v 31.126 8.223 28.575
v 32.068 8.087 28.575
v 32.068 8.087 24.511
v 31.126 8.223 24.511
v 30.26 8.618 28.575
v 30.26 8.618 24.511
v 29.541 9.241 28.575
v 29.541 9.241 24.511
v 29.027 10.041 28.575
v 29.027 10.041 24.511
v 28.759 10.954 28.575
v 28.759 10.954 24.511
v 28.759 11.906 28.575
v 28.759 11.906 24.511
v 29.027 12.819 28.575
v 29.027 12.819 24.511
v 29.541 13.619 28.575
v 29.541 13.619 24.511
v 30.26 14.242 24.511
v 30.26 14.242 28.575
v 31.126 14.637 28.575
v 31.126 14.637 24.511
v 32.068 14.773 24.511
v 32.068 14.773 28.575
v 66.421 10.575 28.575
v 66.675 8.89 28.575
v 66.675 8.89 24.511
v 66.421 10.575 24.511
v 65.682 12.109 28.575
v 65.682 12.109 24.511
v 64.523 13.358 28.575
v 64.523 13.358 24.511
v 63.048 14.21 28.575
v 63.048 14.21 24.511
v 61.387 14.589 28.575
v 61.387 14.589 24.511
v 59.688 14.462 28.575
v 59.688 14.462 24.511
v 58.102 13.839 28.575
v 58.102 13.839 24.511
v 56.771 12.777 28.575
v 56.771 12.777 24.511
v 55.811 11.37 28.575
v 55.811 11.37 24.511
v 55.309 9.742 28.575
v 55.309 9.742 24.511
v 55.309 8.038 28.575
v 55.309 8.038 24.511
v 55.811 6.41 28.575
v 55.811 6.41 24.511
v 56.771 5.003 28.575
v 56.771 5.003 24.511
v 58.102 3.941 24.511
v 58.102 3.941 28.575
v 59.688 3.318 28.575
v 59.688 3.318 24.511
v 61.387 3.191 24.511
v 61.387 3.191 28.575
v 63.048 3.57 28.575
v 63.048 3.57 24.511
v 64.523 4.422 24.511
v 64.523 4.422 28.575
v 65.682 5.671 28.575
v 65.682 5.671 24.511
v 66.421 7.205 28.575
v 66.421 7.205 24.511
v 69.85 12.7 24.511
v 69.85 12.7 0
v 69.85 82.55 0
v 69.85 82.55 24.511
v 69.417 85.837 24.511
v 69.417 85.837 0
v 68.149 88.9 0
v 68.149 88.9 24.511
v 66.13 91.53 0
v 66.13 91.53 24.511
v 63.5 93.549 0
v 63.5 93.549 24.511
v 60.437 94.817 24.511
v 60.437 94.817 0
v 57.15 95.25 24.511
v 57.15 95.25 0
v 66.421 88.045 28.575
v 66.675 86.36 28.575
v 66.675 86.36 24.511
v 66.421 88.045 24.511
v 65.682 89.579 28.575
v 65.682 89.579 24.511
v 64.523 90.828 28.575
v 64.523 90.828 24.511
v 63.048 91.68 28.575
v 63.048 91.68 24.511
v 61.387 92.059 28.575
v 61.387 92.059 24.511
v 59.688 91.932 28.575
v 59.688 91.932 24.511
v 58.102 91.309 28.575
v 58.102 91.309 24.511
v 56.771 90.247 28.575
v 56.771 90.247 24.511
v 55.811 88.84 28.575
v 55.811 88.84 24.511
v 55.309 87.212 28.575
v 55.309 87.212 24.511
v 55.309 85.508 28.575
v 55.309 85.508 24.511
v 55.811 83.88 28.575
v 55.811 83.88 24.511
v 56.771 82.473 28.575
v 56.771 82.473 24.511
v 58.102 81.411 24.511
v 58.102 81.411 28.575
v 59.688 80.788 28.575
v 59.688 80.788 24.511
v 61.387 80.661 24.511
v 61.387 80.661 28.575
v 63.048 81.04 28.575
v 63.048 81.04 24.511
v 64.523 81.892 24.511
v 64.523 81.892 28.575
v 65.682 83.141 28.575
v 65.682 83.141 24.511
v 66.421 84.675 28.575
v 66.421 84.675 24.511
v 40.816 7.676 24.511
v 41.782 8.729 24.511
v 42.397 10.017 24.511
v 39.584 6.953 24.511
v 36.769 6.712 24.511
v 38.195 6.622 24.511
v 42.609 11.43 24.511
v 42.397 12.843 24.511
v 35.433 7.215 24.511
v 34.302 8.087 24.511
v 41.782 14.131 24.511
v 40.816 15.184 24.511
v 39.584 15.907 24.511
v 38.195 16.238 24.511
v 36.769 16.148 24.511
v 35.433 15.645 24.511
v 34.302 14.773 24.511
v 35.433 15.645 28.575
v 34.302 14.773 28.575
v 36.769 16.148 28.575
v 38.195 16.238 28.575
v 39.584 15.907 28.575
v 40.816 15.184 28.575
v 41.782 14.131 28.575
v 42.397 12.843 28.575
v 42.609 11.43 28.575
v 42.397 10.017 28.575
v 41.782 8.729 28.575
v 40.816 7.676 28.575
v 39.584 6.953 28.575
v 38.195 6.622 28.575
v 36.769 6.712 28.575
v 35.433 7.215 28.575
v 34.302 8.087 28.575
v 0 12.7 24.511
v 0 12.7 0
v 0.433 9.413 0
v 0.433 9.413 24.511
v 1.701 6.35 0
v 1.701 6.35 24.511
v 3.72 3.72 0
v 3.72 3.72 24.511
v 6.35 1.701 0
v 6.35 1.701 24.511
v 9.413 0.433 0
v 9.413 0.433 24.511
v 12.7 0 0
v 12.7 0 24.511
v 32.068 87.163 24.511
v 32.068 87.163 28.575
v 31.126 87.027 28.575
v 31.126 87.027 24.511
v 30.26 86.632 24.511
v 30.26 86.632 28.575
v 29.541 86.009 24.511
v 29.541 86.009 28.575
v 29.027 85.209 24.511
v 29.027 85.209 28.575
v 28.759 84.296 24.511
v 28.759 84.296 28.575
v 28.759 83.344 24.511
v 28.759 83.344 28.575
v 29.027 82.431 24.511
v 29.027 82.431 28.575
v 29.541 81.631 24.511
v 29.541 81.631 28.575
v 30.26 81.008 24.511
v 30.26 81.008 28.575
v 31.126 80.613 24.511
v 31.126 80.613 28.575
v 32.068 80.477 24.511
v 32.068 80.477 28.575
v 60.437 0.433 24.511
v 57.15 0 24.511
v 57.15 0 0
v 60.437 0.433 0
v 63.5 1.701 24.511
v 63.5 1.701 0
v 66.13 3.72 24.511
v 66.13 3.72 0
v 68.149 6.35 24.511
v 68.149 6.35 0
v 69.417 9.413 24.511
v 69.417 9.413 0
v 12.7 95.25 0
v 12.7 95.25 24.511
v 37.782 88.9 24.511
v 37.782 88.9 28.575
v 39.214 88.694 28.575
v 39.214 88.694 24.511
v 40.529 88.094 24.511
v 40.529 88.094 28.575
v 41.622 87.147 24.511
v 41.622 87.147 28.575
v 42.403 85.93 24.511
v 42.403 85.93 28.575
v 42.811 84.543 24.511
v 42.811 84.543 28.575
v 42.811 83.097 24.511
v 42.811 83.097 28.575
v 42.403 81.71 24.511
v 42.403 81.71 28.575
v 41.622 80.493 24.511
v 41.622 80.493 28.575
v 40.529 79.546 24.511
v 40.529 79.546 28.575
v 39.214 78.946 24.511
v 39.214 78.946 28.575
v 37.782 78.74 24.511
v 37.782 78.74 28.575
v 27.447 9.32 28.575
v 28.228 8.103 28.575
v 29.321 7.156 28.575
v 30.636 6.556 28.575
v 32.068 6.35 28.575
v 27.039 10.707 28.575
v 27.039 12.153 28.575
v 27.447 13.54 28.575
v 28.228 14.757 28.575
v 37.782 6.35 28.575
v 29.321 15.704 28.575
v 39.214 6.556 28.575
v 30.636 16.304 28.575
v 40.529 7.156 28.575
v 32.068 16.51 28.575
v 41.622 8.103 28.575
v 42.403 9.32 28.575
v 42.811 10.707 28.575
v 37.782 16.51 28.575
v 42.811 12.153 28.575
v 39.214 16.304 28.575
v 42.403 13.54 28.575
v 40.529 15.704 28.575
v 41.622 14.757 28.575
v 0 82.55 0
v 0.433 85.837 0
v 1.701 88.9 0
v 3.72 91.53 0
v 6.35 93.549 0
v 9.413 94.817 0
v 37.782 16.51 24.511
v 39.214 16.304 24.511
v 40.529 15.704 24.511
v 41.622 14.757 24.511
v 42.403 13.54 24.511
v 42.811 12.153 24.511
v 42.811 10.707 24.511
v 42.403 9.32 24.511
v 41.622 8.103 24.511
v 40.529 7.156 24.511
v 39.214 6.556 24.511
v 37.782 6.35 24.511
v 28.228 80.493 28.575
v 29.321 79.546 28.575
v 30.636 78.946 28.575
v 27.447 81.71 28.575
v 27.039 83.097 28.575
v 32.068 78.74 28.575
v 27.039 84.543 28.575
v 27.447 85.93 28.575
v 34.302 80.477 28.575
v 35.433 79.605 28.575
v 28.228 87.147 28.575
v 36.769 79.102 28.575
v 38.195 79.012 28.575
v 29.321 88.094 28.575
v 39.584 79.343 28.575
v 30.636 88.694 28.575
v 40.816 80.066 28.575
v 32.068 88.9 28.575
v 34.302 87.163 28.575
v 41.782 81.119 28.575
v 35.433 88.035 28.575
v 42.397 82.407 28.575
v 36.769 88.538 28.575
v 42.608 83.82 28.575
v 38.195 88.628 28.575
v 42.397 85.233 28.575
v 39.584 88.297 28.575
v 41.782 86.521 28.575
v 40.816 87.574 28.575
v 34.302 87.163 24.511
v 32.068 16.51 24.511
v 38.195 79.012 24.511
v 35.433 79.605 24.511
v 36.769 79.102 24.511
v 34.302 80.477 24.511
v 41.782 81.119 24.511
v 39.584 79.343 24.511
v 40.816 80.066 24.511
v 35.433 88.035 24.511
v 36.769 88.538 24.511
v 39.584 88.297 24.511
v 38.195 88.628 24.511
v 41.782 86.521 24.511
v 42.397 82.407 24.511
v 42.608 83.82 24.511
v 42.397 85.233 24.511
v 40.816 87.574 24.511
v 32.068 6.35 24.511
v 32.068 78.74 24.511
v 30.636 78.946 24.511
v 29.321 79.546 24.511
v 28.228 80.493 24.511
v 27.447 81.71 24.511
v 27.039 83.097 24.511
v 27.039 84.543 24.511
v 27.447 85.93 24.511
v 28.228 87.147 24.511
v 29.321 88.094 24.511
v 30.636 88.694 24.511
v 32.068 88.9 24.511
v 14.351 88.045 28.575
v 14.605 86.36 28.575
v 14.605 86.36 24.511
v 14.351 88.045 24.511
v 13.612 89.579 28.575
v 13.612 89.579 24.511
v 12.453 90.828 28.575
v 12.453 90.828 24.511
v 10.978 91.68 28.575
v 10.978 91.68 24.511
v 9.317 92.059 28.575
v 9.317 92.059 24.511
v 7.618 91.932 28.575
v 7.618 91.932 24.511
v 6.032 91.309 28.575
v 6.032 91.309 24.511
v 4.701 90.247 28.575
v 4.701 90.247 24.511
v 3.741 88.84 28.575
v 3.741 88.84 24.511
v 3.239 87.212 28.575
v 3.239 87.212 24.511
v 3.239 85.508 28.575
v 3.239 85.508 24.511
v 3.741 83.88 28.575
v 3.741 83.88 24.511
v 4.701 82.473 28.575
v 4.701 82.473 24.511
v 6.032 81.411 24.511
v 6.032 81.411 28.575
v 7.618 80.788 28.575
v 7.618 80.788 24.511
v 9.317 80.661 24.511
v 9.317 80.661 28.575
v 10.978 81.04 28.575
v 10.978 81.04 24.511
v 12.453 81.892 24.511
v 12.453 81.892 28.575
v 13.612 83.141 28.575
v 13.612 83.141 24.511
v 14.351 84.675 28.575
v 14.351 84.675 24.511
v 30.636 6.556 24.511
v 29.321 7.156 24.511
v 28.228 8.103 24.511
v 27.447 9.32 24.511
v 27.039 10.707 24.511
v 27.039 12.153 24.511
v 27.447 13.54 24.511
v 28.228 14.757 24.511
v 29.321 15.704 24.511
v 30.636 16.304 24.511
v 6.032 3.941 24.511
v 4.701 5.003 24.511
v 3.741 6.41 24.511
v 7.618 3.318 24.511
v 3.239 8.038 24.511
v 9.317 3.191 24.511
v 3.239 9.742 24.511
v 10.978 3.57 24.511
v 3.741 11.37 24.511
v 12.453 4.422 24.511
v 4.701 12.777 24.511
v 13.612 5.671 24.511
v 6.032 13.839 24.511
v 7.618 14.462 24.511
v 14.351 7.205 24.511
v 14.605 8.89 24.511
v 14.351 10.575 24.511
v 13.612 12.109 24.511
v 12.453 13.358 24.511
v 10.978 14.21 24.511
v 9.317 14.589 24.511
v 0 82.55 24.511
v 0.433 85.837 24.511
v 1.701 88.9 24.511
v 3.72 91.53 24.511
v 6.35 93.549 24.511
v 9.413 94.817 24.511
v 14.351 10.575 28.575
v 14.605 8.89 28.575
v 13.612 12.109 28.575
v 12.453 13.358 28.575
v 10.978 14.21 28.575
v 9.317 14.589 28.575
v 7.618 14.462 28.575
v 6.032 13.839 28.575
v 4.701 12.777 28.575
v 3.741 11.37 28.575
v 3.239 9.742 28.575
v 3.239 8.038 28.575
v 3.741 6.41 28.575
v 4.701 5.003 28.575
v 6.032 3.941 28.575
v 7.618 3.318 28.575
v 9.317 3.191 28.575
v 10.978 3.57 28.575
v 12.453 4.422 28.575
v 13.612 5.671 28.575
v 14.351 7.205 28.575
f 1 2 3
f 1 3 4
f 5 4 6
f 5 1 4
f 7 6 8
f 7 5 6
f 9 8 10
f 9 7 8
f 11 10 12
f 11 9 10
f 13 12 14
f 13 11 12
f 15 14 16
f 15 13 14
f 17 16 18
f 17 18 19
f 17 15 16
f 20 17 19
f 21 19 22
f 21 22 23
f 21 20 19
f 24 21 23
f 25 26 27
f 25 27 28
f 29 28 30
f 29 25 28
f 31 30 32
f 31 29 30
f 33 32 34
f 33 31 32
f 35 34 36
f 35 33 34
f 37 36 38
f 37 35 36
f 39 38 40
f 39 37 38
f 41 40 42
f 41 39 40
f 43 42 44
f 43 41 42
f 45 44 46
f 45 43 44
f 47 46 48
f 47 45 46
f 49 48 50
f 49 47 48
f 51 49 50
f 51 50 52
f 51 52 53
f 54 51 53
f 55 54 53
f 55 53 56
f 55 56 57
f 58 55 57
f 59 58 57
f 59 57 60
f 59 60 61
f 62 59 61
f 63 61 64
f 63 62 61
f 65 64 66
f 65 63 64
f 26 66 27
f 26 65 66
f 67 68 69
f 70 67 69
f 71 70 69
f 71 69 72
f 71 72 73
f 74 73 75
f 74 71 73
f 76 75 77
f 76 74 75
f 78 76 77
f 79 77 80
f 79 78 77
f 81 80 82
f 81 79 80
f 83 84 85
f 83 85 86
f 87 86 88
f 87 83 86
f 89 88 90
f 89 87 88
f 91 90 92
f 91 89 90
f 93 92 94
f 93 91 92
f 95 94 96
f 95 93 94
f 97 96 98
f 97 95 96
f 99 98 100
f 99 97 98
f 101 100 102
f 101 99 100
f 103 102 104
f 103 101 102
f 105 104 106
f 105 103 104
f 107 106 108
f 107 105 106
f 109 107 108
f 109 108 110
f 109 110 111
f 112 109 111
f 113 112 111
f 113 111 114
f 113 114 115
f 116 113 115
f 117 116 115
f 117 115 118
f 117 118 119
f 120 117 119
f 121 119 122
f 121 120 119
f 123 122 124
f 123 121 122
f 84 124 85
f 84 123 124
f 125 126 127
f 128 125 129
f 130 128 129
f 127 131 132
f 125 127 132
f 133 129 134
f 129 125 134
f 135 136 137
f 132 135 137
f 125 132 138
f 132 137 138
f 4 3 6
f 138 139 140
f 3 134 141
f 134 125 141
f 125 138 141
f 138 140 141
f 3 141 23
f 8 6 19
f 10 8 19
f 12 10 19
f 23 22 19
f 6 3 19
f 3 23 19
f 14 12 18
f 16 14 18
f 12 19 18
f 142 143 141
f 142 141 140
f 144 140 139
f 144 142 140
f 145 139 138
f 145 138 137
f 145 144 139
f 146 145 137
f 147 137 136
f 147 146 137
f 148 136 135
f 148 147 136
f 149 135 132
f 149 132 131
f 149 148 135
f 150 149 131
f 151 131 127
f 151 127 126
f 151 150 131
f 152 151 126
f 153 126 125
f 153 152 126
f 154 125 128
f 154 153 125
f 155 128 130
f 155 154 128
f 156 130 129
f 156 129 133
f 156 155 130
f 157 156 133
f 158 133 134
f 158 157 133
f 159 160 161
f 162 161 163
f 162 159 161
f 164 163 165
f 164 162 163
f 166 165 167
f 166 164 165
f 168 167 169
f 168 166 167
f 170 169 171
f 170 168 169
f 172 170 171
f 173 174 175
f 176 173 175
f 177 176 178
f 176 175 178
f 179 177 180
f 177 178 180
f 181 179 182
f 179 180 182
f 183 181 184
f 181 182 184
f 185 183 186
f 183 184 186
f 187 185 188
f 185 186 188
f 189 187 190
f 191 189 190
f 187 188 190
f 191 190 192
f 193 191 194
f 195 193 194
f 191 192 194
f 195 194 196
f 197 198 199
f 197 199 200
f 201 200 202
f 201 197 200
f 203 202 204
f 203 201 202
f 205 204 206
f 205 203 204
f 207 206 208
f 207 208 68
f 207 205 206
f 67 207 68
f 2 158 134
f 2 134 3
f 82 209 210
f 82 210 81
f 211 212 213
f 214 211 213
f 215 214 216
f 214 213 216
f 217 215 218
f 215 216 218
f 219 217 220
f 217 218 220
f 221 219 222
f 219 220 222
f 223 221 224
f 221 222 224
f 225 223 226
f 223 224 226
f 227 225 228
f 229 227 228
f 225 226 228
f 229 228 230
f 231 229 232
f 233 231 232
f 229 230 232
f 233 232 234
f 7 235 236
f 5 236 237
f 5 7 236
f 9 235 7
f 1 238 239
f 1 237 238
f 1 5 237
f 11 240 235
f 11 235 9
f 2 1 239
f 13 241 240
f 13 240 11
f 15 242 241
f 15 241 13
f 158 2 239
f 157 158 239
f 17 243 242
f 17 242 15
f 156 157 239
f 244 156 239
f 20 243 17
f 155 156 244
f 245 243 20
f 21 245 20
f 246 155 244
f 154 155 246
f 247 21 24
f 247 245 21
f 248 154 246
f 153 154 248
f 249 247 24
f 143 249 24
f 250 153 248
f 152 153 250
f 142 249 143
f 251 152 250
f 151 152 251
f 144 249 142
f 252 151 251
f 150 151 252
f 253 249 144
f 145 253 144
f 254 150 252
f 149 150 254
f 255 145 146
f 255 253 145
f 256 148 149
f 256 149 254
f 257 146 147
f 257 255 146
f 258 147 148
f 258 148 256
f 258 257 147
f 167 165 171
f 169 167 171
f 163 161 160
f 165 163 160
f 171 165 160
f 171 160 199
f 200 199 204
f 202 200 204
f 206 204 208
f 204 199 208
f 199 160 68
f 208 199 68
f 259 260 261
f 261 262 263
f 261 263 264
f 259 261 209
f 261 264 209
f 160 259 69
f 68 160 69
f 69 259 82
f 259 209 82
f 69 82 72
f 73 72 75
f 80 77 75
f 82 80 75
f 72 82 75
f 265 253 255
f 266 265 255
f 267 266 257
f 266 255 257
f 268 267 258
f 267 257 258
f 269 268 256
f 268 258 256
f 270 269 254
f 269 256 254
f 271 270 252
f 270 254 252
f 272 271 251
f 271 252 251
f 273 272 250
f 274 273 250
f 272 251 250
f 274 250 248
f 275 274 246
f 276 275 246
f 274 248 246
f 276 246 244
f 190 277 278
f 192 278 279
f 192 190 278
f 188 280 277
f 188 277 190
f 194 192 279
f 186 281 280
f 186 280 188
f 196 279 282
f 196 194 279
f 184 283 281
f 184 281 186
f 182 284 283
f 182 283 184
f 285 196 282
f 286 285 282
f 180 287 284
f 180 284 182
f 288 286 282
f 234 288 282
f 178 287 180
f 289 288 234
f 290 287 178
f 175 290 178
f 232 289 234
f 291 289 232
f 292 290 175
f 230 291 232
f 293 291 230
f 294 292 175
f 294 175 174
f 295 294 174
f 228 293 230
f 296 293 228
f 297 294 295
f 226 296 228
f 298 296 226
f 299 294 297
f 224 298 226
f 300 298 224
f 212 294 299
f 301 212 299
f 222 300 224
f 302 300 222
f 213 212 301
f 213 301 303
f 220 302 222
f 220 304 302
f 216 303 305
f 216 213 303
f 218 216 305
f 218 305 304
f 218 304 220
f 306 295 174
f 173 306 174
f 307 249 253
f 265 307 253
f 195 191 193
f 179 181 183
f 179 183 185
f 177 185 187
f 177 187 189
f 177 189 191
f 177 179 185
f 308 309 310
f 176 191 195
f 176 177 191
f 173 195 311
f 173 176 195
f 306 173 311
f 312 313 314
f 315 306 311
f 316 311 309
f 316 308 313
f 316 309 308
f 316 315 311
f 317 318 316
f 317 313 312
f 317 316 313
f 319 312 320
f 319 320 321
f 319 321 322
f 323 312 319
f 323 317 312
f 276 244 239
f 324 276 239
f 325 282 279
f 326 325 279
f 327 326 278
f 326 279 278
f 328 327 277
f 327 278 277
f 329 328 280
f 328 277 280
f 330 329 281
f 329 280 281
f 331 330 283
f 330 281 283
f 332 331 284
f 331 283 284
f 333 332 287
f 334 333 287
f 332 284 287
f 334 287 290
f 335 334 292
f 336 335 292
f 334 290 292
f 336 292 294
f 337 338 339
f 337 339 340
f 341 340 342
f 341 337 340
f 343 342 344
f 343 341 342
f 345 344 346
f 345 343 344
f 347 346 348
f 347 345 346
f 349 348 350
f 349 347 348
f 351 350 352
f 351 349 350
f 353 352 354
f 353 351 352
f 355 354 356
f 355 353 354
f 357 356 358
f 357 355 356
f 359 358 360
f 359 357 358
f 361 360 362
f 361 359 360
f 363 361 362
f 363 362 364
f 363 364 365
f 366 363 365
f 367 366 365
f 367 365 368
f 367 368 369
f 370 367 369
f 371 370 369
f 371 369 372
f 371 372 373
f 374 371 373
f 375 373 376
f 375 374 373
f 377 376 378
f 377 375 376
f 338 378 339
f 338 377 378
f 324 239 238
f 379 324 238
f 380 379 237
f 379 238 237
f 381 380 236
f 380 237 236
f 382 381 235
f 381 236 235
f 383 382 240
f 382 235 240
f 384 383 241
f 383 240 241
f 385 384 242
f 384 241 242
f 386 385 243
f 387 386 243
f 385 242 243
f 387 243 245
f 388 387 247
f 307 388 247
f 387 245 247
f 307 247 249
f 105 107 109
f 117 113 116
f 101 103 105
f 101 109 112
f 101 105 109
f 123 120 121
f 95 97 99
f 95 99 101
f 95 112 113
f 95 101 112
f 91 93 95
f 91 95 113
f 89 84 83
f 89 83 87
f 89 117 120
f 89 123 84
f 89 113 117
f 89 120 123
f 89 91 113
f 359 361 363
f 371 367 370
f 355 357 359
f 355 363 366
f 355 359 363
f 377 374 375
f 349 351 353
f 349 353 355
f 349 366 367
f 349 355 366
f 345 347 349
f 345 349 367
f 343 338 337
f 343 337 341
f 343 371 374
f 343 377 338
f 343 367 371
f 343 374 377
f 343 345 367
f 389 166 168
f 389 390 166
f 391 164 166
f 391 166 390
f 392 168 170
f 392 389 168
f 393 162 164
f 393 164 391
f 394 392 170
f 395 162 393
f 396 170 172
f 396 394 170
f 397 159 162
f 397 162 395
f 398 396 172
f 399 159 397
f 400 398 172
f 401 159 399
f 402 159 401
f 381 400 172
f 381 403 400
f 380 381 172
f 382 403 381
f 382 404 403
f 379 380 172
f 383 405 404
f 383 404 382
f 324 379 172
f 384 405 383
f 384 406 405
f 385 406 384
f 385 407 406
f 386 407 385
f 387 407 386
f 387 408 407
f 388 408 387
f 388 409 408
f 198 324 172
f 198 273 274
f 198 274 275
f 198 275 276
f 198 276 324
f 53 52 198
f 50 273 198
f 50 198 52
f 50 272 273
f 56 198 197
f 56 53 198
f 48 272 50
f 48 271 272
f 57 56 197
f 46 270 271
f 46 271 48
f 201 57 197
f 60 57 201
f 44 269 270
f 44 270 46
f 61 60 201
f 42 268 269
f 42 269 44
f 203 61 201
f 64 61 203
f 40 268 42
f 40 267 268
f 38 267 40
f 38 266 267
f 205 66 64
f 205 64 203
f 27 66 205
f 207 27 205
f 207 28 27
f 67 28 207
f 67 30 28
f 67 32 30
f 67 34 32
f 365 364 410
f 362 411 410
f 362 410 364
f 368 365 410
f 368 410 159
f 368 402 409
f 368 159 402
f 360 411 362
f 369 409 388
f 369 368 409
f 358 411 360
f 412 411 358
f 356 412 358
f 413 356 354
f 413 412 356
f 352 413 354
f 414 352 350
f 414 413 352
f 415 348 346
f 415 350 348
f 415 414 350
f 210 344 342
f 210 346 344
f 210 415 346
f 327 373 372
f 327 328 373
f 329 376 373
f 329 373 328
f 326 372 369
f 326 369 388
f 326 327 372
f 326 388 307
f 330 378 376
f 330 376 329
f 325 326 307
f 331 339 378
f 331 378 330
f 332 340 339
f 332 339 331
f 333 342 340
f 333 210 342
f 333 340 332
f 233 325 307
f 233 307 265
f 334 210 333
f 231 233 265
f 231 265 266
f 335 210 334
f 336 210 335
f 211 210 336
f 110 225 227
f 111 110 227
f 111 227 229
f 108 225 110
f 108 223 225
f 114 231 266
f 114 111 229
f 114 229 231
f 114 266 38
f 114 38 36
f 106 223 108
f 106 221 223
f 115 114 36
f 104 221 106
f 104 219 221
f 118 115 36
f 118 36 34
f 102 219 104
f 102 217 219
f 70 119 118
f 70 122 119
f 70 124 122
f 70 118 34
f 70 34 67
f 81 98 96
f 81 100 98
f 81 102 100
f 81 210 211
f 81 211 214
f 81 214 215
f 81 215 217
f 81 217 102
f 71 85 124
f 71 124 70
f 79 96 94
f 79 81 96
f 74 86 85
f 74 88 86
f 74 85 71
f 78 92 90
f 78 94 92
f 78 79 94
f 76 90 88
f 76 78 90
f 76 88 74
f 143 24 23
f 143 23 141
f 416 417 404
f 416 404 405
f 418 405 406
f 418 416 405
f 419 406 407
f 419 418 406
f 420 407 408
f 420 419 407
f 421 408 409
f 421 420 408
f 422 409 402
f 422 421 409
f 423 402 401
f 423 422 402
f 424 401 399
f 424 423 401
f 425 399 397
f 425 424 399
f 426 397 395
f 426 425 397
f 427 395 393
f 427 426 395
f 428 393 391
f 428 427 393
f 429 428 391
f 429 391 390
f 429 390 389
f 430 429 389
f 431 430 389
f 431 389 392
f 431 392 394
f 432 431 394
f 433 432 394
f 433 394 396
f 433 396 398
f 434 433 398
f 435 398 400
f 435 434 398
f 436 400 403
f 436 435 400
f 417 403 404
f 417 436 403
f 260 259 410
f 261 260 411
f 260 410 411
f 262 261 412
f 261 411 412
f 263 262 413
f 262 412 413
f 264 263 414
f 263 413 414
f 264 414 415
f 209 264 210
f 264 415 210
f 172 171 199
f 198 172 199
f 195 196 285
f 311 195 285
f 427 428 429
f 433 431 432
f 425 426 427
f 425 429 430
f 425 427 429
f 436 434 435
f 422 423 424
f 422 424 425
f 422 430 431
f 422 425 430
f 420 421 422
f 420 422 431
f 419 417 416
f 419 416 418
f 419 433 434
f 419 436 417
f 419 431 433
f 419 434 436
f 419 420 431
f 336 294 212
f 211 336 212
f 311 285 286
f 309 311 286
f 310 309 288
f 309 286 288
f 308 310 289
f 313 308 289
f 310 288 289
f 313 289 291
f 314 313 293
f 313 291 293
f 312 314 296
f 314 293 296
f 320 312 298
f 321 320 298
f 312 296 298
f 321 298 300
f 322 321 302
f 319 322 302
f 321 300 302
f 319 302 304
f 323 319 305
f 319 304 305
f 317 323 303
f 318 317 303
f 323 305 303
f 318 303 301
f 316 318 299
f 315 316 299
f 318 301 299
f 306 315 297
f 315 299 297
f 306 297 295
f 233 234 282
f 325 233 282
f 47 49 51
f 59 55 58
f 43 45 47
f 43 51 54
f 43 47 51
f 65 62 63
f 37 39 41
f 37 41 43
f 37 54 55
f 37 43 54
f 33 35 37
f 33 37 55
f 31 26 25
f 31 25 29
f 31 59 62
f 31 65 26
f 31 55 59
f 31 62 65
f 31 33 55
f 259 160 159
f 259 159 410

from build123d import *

# Parameters (mm, degrees)
SKETCH1_W           = 69.85
SKETCH1_H           = 95.25
BOSS_EXTRUDE1_DEPTH = 28.575
FILLET1_R           = 12.7
SKETCH2_OUTSIDE_W   = 96.154
SKETCH2_OUTSIDE_H   = 121.554
SKETCH2_OUTSIDE_R   = 5.715
CUT_EXTRUDE1_DEPTH  = 4.064


with BuildPart() as part:
    # Sketch1 → Boss-Extrude1 (new body)
    with BuildSketch(Plane.XY):
        with Locations((34.925, 47.625)):
            Rectangle(SKETCH1_W, SKETCH1_H)
    extrude(amount=BOSS_EXTRUDE1_DEPTH)

    # Fillet1
    fillet1_edges = [part.edges().sort_by_distance(p)[0] for p in [
        (0, 95.25, 14.2875),
        (69.85, 95.25, 14.2875),
        (69.85, 0, 14.2875),
        (0, 0, 14.2875),
    ]]
    fillet(fillet1_edges, radius=FILLET1_R)

    # Sketch2 outside → Cut-Extrude1 (cut)
    # profile 1 of 3: a face of its own
    with BuildSketch(Plane.XY.offset(28.575)):
        with Locations((34.925, 47.625)):
            Rectangle(SKETCH2_OUTSIDE_W, SKETCH2_OUTSIDE_H)
        with Locations((60.96, 8.89)):
            Circle(SKETCH2_OUTSIDE_R, mode=Mode.SUBTRACT)
        with Locations((8.89, 8.89)):
            Circle(SKETCH2_OUTSIDE_R, mode=Mode.SUBTRACT)
        with Locations((8.89, 86.36)):
            Circle(SKETCH2_OUTSIDE_R, mode=Mode.SUBTRACT)
        with Locations((60.96, 86.36)):
            Circle(SKETCH2_OUTSIDE_R, mode=Mode.SUBTRACT)
        with BuildLine():
            Line((37.7825, 6.35), (32.0675, 6.35))
            ThreePointArc((32.0675, 6.35), (26.9875, 11.43), (32.0675, 16.51))
            Line((32.0675, 16.51), (37.7825, 16.51))
            ThreePointArc((37.7825, 16.51), (42.8625, 11.43), (37.7825, 6.35))
        make_face(mode=Mode.SUBTRACT)
        with BuildLine():
            Line((37.7825, 78.74), (32.0675, 78.74))
            ThreePointArc((32.0675, 78.74), (26.9875, 83.82), (32.0675, 88.9))
            Line((32.0675, 88.9), (37.7825, 88.9))
            ThreePointArc((37.7825, 88.9), (42.8625, 83.82), (37.7825, 78.74))
        make_face(mode=Mode.SUBTRACT)
    # profile 2 of 3: a face of its own
    with BuildSketch(Plane.XY.offset(28.575)):
        with BuildLine():
            Line((32.0675, 14.77282006), (34.301719909, 14.77282006))
            ThreePointArc((34.301719909, 14.77282006), (42.6085, 11.43), (34.301719909, 8.08717994))
            Line((34.301719909, 8.08717994), (32.0675, 8.08717994))
            ThreePointArc((32.0675, 8.08717994), (28.72467994, 11.43), (32.0675, 14.77282006))
        make_face()
    # profile 3 of 3: a face of its own
    with BuildSketch(Plane.XY.offset(28.575)):
        with BuildLine():
            Line((32.0675, 80.47717994), (34.301719909, 80.47717994))
            ThreePointArc((34.301719909, 80.47717994), (42.6085, 83.82), (34.301719909, 87.16282006))
            Line((34.301719909, 87.16282006), (32.0675, 87.16282006))
            ThreePointArc((32.0675, 87.16282006), (28.72467994, 83.82), (32.0675, 80.47717994))
        make_face()
    extrude(amount=-CUT_EXTRUDE1_DEPTH, mode=Mode.SUBTRACT)


solid = part.part
